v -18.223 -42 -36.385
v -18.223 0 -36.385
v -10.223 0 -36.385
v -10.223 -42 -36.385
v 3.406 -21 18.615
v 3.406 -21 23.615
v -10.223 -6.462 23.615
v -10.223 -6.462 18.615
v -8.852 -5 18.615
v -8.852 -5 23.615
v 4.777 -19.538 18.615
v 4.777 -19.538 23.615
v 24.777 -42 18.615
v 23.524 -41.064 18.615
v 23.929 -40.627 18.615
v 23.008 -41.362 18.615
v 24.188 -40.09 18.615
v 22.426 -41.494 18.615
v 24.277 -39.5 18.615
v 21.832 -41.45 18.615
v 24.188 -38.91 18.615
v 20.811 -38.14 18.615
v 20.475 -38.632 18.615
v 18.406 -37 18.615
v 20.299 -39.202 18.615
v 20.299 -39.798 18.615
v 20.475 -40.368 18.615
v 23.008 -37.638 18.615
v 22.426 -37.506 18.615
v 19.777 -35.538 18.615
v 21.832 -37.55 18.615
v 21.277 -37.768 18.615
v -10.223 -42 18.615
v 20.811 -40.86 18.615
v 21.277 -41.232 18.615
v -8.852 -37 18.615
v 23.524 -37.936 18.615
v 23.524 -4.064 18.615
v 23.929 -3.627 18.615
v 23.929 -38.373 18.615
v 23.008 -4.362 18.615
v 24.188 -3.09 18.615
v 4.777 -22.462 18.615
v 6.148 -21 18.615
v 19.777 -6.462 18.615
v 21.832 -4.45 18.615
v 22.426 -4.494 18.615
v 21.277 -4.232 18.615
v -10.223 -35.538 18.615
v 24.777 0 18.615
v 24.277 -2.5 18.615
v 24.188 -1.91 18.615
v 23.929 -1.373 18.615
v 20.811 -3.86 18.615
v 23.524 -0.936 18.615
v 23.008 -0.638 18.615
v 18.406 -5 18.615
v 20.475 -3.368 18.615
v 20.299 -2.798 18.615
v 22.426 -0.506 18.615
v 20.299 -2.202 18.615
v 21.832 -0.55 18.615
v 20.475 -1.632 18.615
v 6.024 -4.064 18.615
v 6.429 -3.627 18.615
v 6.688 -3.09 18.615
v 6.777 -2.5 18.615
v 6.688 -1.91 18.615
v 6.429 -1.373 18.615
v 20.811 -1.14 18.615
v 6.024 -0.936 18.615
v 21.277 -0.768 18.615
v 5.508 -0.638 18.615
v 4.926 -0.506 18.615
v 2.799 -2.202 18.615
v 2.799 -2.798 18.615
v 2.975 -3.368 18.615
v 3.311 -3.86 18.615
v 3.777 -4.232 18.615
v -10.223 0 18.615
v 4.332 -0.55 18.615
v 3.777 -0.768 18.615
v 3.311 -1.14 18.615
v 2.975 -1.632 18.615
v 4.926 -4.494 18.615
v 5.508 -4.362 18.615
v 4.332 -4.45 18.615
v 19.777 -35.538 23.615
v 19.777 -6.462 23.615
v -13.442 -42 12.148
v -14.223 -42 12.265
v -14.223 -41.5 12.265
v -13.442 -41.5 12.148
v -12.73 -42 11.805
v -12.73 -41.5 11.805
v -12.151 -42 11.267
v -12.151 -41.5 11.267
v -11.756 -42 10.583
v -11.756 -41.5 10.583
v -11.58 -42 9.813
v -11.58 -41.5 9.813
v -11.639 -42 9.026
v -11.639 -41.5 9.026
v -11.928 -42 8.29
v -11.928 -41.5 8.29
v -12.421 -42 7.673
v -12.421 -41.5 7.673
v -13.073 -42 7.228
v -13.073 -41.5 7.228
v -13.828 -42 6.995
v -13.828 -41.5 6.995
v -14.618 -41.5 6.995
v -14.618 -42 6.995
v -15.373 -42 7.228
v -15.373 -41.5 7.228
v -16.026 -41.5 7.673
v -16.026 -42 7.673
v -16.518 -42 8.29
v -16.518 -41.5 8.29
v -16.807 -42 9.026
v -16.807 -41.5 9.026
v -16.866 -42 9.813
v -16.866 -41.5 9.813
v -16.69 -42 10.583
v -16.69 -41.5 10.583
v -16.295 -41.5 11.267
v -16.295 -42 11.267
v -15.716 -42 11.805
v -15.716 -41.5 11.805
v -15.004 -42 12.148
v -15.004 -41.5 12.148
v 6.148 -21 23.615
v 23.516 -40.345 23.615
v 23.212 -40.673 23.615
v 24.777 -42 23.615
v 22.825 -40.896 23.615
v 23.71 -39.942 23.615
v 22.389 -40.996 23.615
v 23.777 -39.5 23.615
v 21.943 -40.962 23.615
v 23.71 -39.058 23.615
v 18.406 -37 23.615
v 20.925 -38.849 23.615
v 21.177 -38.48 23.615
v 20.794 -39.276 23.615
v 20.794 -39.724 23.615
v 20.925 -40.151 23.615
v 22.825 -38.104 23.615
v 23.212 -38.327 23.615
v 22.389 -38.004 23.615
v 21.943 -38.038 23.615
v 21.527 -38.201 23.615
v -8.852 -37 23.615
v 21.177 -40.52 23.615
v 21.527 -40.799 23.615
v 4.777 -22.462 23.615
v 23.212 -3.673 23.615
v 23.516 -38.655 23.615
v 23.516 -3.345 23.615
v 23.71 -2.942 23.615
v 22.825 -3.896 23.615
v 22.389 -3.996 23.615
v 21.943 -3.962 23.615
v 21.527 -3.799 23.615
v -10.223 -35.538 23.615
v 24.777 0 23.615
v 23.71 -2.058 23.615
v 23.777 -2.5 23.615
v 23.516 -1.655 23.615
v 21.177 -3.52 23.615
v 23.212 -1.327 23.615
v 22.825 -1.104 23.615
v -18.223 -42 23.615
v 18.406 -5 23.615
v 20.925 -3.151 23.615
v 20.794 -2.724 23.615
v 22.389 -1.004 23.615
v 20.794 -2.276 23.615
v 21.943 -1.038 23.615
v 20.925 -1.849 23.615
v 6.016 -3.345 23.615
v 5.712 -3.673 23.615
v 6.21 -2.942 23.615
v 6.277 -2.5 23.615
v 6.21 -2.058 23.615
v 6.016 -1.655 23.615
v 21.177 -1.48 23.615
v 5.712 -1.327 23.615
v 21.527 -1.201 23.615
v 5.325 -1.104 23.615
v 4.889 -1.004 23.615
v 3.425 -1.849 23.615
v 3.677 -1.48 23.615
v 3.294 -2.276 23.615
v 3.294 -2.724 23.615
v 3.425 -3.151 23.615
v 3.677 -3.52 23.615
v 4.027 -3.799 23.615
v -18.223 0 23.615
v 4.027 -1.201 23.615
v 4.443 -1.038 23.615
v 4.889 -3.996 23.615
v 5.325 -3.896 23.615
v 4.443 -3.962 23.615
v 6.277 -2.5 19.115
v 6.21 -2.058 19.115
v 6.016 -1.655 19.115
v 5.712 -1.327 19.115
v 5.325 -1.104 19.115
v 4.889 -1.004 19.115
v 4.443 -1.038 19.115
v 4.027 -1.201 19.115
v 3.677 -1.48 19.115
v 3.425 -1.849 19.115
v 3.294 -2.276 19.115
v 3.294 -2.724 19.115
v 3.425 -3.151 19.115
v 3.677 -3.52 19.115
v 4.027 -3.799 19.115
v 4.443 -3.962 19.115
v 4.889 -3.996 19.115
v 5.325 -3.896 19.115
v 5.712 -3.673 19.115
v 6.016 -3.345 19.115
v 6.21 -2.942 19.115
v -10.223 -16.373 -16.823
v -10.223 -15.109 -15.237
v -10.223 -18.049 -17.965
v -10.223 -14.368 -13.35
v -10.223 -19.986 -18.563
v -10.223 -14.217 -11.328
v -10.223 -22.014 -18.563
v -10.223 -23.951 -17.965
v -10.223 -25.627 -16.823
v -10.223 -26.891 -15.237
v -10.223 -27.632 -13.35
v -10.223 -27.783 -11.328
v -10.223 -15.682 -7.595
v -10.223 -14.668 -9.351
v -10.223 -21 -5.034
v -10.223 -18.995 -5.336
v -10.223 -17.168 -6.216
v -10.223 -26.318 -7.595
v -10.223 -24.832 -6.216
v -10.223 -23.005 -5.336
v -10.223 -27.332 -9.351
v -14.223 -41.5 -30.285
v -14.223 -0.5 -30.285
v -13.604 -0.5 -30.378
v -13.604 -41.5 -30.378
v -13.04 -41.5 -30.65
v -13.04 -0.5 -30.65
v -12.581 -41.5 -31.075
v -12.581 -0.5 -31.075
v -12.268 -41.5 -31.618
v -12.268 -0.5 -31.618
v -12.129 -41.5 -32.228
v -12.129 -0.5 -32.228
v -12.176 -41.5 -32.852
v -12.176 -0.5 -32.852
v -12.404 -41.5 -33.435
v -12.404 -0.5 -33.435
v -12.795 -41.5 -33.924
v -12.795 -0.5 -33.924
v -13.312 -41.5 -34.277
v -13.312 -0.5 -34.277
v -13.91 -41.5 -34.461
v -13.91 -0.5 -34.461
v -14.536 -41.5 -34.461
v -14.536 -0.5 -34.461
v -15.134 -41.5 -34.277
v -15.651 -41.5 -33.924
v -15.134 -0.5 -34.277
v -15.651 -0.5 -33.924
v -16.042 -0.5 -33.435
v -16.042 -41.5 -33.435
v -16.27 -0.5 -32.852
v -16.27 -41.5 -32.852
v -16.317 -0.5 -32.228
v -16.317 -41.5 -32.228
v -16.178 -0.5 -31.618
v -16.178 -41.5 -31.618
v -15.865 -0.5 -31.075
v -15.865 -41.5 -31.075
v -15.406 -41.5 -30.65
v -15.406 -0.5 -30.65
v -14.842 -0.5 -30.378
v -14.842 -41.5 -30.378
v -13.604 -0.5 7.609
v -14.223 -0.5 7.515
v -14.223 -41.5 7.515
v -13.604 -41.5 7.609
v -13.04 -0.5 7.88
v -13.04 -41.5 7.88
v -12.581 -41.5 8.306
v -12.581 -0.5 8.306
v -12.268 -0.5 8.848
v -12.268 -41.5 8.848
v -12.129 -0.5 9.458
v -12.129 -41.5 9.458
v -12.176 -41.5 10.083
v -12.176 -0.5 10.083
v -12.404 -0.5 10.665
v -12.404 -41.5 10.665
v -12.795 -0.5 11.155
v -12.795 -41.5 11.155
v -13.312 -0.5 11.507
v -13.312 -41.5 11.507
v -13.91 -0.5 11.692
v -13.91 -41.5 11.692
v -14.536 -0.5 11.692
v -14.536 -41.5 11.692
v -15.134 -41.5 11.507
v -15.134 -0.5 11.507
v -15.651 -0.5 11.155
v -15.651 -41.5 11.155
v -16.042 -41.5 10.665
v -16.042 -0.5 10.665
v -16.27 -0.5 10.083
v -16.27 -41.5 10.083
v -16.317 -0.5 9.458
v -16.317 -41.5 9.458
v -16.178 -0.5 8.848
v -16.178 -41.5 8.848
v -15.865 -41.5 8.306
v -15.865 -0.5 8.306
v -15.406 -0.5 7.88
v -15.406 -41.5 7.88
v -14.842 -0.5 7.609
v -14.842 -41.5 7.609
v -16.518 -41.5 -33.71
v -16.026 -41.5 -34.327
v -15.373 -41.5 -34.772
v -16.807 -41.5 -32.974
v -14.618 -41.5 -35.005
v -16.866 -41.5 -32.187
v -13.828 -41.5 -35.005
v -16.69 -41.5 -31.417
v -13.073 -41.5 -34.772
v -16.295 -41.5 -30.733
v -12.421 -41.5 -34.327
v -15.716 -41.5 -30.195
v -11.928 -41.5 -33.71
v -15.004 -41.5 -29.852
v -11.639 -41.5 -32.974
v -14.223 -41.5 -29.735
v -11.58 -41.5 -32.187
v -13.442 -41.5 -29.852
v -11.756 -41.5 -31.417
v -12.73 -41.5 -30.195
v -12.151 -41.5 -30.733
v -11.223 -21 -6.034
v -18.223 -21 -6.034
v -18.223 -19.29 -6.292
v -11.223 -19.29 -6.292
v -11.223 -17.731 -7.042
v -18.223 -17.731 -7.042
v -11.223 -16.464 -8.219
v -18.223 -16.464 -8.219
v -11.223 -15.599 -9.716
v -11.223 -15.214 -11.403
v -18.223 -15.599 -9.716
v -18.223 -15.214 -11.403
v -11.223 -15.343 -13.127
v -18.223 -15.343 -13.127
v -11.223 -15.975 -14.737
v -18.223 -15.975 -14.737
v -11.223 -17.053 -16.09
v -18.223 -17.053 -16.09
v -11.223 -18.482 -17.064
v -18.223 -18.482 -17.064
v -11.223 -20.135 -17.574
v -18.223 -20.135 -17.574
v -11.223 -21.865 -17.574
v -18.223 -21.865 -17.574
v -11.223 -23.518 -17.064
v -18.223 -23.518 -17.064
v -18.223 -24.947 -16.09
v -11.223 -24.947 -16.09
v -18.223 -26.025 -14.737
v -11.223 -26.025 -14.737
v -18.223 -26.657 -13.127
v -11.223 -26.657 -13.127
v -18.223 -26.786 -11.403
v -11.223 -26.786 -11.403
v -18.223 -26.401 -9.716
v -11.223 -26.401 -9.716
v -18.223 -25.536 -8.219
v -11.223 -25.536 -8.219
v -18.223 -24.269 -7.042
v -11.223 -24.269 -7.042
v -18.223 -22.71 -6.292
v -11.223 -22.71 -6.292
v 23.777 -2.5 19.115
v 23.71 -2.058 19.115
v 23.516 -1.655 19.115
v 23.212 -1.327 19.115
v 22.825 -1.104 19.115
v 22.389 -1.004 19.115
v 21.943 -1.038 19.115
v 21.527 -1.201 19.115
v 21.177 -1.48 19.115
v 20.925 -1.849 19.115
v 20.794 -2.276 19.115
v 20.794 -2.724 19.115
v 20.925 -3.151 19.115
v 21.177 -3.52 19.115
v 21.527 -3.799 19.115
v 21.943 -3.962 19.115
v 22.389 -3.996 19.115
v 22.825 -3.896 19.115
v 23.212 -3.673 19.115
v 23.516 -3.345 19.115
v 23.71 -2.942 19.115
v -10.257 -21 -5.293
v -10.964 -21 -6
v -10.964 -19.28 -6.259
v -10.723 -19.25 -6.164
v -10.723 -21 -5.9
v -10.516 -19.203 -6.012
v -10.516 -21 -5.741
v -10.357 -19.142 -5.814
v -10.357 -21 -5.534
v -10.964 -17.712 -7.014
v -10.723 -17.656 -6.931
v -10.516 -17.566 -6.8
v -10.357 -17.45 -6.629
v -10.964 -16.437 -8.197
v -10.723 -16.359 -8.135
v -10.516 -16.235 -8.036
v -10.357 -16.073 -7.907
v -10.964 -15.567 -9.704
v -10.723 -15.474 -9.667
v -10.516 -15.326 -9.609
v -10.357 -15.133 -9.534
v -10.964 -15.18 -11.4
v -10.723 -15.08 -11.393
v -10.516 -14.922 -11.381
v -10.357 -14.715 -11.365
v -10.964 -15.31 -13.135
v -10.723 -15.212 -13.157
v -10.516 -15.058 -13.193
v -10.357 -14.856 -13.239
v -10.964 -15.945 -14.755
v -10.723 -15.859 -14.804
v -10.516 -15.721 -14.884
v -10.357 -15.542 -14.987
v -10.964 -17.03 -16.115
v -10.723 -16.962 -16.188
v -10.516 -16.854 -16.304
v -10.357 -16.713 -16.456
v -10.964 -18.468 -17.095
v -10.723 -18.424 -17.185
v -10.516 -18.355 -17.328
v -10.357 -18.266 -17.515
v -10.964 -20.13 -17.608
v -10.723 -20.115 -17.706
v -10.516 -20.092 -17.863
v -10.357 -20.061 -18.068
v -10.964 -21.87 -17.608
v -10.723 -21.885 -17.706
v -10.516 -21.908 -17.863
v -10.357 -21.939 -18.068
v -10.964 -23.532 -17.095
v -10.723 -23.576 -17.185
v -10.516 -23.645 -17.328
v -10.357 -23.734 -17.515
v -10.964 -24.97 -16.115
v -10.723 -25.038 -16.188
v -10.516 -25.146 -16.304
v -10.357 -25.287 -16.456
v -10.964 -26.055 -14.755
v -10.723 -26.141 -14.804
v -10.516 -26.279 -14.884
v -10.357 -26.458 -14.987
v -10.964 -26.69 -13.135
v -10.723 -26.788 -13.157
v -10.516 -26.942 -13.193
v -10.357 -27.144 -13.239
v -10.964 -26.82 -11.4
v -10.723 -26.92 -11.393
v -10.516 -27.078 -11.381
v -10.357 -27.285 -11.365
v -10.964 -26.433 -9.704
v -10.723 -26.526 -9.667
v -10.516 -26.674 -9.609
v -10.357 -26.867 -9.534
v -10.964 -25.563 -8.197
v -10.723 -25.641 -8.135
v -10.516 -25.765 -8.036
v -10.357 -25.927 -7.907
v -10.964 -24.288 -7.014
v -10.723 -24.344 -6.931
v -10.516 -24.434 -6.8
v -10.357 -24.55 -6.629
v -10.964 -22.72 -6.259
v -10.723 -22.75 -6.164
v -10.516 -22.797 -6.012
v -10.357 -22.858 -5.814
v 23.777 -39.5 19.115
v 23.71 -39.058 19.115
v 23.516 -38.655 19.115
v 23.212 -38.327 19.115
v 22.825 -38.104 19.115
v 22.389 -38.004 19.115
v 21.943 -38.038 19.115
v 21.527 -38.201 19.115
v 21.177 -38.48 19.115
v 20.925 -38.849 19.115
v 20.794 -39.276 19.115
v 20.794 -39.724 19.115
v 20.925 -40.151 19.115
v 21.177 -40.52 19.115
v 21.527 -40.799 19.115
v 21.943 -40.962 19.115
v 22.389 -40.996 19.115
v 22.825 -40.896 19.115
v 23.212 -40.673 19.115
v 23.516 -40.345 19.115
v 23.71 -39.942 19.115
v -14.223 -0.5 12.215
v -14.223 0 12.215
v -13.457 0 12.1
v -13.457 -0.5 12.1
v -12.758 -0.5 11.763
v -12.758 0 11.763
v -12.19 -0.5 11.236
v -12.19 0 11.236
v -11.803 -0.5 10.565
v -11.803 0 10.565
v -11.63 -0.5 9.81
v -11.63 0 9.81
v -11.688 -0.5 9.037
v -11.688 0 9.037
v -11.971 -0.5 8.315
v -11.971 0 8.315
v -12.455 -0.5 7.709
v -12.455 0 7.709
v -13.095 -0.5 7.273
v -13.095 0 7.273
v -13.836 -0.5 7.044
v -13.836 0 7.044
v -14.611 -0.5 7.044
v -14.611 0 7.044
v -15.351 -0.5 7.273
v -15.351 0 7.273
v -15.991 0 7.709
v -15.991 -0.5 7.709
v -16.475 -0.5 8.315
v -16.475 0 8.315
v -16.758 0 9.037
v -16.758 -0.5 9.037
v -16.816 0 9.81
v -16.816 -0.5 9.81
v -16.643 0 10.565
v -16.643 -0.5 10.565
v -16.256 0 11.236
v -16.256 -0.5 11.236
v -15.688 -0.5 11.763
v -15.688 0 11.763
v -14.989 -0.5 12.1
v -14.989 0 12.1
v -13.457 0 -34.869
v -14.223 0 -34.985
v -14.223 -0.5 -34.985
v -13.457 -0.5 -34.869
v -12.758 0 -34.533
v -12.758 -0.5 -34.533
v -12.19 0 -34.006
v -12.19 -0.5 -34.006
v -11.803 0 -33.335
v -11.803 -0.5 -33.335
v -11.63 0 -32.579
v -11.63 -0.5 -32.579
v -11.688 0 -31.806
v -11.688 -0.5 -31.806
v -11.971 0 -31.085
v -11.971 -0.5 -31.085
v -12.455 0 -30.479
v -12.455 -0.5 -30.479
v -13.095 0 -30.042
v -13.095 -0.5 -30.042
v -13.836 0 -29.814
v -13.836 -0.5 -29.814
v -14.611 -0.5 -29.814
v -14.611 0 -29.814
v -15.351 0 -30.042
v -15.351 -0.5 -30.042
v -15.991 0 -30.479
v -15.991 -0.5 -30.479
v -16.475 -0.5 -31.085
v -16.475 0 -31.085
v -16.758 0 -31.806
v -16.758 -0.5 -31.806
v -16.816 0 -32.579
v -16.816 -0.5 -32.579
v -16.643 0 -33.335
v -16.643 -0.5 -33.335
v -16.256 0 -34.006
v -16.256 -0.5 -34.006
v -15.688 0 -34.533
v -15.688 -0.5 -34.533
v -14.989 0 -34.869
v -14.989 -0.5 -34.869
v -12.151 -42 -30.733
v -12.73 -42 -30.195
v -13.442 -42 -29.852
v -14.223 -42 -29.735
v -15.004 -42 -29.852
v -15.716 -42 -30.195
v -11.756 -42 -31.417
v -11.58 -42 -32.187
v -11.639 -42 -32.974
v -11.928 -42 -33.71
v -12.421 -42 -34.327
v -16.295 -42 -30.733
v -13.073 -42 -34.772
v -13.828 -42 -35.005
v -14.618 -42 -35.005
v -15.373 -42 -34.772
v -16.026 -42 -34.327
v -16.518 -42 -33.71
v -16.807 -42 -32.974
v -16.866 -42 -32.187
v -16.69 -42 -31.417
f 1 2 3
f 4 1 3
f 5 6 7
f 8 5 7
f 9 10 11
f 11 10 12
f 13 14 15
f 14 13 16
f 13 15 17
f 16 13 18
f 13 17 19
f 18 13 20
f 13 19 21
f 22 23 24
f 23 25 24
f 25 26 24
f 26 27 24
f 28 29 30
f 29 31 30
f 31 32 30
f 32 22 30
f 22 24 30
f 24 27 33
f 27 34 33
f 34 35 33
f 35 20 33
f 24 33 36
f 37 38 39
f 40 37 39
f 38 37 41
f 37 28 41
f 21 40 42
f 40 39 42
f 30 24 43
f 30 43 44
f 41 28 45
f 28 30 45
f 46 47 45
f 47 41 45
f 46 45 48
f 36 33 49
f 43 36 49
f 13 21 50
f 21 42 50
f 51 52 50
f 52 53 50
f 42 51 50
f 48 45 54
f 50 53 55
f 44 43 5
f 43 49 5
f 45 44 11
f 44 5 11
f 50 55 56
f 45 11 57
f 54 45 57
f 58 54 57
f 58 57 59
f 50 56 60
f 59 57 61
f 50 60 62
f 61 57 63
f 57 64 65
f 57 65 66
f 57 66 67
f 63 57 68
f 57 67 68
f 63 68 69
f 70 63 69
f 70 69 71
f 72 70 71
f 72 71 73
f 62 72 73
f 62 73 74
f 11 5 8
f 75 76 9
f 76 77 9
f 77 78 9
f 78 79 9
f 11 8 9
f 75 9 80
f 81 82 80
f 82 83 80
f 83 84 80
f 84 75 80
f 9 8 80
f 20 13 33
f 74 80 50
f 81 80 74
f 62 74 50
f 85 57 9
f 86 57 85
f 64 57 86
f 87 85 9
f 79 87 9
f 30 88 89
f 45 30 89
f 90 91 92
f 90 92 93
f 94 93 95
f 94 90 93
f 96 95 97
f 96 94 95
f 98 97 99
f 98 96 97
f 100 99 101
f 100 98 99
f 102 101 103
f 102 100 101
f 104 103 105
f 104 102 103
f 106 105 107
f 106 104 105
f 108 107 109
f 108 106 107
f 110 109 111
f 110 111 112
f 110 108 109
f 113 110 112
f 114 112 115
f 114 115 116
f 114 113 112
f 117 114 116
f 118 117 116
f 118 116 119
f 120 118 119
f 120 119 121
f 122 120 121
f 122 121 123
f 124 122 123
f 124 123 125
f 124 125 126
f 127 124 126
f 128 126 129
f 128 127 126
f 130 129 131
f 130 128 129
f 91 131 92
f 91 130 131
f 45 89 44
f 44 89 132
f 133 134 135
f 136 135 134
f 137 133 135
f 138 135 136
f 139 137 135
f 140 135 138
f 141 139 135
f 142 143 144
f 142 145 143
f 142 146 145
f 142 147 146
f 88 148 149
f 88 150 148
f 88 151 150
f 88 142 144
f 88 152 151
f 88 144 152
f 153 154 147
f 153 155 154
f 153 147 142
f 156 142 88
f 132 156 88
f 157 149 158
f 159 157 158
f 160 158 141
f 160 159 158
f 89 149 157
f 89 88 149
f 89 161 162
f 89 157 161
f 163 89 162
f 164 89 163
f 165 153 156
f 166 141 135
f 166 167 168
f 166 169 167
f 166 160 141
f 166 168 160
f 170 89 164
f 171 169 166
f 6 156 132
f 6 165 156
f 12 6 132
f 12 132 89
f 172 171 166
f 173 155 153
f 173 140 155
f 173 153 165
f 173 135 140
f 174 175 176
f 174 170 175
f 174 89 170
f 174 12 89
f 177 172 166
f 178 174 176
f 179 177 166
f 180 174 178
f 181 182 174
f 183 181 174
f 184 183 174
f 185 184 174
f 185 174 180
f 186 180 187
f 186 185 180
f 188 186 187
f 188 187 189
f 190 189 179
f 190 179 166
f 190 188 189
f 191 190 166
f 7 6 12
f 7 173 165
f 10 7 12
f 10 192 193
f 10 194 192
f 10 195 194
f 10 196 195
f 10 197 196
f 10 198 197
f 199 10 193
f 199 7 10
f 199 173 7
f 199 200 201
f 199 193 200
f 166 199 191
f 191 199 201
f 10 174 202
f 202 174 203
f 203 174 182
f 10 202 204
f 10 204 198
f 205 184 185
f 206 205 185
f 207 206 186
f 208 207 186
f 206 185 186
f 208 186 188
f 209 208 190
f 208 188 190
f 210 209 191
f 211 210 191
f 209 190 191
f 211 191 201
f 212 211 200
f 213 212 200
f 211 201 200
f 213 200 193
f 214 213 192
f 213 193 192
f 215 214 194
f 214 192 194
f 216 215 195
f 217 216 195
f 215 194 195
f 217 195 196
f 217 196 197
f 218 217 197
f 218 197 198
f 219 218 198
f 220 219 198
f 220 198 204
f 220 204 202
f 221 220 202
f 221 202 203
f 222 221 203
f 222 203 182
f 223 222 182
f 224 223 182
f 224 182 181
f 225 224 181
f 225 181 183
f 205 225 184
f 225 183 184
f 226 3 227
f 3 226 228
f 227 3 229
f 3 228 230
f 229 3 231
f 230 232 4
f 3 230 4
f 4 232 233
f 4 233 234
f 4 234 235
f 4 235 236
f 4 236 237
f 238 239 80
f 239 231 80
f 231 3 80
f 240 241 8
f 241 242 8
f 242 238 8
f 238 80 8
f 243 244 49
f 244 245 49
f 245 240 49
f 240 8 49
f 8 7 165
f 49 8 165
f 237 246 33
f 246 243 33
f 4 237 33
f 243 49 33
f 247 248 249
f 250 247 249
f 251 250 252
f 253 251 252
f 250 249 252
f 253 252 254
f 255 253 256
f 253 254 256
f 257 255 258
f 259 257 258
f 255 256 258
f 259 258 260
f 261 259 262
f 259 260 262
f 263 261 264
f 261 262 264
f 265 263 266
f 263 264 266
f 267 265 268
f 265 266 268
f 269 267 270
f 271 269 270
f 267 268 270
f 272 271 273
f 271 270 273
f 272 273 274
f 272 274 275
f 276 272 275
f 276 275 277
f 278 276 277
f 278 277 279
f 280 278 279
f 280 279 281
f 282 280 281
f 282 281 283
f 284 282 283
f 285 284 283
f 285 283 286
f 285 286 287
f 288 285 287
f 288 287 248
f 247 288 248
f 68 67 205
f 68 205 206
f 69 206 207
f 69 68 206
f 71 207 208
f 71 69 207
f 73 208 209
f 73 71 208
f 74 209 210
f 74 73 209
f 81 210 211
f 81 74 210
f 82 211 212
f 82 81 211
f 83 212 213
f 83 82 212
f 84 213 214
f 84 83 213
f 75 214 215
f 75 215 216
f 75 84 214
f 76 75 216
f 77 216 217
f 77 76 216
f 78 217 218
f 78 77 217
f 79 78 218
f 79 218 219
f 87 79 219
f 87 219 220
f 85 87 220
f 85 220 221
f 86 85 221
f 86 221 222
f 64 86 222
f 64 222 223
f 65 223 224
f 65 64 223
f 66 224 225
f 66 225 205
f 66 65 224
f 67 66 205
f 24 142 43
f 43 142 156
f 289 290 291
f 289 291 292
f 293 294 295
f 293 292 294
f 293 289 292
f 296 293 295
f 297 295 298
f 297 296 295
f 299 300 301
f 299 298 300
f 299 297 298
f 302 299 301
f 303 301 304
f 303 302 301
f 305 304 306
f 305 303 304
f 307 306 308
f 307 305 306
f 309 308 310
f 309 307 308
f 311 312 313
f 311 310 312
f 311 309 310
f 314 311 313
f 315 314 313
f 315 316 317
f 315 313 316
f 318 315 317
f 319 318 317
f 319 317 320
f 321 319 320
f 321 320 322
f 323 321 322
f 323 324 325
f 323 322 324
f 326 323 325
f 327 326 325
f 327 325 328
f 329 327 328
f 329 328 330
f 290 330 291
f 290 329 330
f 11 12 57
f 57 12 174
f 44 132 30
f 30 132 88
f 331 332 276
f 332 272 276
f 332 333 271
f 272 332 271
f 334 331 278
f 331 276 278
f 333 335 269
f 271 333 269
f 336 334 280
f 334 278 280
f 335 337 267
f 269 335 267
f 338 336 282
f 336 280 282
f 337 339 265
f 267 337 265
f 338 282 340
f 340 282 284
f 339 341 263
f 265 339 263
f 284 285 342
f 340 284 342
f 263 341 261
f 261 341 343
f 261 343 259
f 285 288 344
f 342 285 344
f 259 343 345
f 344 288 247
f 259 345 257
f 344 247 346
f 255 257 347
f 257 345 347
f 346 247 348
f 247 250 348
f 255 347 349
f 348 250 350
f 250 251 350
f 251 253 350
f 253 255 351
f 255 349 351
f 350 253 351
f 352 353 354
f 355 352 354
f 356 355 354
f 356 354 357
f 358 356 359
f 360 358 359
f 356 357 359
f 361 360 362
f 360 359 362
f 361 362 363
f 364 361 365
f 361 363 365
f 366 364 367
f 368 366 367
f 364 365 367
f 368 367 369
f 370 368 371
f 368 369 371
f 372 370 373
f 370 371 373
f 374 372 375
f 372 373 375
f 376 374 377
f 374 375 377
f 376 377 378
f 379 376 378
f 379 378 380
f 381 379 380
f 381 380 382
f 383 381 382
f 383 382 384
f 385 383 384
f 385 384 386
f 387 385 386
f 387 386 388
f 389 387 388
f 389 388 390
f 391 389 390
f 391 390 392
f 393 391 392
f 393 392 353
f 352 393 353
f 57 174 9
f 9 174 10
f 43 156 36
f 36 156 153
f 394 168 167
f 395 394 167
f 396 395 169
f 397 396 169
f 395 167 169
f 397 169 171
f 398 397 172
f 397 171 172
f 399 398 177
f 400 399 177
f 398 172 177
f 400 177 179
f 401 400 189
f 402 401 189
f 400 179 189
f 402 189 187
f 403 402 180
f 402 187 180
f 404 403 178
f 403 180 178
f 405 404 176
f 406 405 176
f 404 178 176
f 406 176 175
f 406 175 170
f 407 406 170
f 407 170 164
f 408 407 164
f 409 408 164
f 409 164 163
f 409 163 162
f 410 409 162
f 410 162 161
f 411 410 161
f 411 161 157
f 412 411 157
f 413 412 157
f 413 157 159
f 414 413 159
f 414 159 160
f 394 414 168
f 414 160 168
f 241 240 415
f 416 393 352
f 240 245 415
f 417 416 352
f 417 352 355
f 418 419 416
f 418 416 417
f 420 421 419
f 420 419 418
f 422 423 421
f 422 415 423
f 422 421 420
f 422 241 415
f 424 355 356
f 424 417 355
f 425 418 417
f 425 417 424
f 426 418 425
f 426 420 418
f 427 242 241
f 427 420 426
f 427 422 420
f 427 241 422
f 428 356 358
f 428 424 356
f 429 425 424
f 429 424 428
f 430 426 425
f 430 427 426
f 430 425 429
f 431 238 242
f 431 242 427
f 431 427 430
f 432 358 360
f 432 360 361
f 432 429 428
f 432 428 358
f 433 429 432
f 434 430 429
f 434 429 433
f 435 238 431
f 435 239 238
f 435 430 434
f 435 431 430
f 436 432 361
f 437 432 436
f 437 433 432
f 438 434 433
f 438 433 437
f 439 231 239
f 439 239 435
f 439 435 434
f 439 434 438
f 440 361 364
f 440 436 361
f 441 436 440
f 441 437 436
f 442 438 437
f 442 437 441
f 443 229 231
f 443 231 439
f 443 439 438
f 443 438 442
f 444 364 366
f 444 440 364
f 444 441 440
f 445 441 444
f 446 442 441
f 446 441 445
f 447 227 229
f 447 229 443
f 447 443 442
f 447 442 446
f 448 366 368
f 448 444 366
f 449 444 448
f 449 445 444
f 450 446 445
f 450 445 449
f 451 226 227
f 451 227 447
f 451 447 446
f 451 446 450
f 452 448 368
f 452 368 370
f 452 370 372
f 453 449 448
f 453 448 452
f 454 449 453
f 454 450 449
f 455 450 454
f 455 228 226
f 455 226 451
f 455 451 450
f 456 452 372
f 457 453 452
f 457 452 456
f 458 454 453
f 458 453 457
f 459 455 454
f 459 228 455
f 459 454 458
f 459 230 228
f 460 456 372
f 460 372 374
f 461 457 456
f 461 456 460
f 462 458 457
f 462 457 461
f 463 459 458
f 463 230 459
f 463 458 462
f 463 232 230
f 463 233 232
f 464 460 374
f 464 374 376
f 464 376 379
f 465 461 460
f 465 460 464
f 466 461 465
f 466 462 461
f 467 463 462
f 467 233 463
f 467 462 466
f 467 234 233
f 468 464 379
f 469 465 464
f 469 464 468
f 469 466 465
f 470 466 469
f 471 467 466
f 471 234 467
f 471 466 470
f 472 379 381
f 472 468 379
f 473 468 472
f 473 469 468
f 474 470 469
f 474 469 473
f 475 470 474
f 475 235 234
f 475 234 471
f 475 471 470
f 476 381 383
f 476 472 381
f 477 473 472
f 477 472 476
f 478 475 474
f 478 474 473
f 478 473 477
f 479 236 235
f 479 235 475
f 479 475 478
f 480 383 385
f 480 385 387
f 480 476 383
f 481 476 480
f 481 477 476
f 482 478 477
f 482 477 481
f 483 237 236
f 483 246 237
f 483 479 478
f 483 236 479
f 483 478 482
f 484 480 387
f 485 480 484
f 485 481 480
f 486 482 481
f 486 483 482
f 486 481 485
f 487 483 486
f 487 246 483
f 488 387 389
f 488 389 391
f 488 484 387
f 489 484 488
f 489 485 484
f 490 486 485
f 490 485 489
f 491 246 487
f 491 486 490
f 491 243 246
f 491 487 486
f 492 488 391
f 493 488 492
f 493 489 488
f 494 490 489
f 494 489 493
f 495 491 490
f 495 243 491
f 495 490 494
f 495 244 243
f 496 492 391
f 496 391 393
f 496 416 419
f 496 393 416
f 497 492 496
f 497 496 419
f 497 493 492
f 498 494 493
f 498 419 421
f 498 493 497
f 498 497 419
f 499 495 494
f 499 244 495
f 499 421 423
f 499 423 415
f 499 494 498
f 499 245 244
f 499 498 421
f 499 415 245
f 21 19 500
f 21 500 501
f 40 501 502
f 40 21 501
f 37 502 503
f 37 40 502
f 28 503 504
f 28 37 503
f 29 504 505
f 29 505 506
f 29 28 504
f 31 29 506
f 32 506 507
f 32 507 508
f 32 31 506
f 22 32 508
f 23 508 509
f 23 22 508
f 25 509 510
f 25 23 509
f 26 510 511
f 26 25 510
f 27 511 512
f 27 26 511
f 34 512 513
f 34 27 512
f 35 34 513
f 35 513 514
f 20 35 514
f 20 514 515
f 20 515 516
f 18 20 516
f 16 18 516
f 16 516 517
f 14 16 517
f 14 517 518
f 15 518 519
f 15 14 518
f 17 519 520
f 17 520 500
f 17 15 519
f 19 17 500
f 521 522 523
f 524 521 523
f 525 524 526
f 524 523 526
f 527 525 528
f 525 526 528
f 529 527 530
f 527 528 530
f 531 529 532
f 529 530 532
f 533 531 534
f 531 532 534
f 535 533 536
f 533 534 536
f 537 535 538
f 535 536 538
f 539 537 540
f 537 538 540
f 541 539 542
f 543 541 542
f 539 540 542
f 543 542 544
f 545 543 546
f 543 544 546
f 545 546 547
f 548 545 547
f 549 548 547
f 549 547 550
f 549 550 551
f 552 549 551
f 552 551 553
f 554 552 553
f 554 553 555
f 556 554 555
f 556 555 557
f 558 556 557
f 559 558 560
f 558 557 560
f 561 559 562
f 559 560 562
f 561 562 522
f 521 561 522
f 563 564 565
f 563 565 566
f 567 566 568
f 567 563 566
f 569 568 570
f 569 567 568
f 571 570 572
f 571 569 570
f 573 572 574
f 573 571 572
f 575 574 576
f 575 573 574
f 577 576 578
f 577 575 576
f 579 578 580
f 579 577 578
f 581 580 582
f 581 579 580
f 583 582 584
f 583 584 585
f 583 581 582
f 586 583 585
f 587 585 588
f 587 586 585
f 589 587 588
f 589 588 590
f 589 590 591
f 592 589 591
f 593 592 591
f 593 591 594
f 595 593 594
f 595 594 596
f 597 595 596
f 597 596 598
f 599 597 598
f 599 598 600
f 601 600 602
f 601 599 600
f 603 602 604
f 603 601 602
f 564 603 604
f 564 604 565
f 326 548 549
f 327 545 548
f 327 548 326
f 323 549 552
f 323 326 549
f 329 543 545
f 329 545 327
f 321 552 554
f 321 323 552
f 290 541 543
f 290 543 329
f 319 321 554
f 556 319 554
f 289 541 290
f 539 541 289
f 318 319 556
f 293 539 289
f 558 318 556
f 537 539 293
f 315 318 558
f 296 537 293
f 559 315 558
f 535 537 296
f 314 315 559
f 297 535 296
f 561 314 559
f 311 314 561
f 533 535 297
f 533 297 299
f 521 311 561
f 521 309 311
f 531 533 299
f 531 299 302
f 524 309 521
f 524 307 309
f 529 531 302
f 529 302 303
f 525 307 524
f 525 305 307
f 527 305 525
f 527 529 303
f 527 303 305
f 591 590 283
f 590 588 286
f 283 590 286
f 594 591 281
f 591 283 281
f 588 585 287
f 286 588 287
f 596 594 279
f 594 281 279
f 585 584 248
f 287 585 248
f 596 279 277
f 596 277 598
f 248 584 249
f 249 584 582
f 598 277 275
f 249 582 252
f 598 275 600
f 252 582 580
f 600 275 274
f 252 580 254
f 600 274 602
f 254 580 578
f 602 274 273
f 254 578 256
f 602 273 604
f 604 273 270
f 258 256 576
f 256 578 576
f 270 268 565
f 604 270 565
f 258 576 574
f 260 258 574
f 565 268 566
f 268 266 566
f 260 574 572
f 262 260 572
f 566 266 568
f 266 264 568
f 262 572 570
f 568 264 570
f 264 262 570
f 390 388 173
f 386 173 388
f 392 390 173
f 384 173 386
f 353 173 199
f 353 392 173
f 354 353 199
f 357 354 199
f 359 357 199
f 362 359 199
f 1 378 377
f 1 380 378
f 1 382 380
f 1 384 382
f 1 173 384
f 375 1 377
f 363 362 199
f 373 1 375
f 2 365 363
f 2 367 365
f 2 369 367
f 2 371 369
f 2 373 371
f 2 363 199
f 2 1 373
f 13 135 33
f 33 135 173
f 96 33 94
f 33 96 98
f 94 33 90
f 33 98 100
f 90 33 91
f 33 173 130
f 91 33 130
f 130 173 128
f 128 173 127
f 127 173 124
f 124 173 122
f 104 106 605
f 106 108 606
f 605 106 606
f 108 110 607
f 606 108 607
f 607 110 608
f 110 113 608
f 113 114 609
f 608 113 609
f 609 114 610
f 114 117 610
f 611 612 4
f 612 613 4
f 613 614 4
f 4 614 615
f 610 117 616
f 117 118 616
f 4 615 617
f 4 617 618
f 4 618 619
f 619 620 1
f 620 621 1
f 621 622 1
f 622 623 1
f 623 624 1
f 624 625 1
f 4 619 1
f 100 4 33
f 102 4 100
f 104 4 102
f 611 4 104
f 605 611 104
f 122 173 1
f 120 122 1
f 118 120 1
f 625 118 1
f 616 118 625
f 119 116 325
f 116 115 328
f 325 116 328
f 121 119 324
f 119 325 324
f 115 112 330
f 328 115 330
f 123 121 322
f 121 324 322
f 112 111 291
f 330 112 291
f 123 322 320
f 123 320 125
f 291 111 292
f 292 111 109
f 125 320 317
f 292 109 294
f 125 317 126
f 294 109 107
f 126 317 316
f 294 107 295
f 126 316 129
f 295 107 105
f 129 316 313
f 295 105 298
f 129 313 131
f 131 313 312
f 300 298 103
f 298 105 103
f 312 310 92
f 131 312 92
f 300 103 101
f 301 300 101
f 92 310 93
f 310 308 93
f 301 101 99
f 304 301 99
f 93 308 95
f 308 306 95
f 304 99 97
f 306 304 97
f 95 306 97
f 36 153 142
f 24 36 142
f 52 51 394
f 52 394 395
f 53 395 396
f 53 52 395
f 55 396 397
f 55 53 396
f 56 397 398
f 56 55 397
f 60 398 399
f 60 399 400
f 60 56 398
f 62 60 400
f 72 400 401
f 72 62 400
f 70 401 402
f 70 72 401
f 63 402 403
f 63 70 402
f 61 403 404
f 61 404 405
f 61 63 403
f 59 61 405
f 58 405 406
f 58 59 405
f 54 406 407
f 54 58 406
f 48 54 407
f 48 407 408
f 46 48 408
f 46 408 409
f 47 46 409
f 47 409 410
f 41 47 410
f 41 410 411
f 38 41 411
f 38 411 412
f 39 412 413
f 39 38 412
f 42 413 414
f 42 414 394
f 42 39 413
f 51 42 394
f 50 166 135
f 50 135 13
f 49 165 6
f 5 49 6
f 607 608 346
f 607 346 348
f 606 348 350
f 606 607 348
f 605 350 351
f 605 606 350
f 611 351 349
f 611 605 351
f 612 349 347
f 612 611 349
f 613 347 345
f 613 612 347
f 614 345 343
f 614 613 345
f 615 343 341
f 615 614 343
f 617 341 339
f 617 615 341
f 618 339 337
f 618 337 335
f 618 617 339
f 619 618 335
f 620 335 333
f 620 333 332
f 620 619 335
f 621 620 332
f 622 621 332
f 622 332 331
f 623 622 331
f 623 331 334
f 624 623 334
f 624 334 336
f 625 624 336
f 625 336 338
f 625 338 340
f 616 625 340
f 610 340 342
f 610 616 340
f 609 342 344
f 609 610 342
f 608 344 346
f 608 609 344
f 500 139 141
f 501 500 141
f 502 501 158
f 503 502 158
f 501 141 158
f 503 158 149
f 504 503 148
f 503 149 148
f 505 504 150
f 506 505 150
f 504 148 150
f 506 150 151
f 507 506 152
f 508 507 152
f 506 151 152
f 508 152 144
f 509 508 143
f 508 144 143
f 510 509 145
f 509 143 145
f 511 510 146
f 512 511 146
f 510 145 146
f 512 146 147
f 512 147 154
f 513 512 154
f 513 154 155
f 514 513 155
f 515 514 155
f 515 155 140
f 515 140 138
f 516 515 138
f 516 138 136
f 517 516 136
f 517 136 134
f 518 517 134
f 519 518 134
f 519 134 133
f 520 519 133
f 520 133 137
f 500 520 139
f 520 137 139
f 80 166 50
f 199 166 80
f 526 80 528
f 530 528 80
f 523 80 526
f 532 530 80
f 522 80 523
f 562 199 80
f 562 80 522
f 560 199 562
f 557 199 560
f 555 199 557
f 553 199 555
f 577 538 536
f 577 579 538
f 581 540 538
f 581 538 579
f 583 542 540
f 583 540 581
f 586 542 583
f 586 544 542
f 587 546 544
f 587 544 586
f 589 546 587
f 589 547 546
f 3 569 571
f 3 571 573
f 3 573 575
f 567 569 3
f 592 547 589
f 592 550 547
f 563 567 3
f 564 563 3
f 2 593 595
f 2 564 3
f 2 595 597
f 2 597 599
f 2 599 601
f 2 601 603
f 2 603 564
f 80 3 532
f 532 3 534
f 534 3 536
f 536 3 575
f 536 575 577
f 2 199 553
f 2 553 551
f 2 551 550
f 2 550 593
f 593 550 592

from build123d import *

# Parameters (mm, degrees)
SKETCH1_W           = 25
SKETCH1_H           = 50
SKETCH1_R           = 3.4
BOSS_EXTRUDE1_DEPTH = 3
SKETCH2_W           = 50
SKETCH2_H           = 3
BOSS_EXTRUDE2_DEPTH = 8
SKETCH3_W           = 8
SKETCH3_H           = 50
BOSS_EXTRUDE3_DEPTH = 42
SKETCH4_R           = 2.65
CUT_EXTRUDE1_DEPTH  = 0.5
SKETCH5_R           = 5.802370205
CUT_EXTRUDE2_DEPTH  = 9
FILLET2_R           = 1
SKETCH6_R           = 12.6
BOSS_EXTRUDE4_DEPTH = 2
FILLET4_R           = 1
SKETCH8_R           = 1.589780168
SKETCH8_R_2         = 1.777428262
CUT_EXTRUDE3_DEPTH  = 10
SKETCH9_W           = 49.021678163
SKETCH9_H           = 20.976854622
CUT_EXTRUDE4_DEPTH  = 68.79439129
SKETCH11_R          = 2.1
CUT_EXTRUDE5_DEPTH  = 59.480168703
SKETCH14_R          = 2.6
CUT_EXTRUDE6_DEPTH  = 0.5
SKETCH15_W          = 8
SKETCH15_H          = 42
BOSS_EXTRUDE5_DEPTH = 10
SKETCH17_W          = 5
SKETCH17_H          = 42
BOSS_EXTRUDE6_DEPTH = 35
CUT_EXTRUDE7_DEPTH  = 5
SKETCH22_R          = 1.5
CUT_EXTRUDE8_DEPTH  = 5
CHAMFER1_SIZE       = 0.5


with BuildPart() as part:
    # Sketch1 → Boss-Extrude1 (new body)
    with BuildSketch(Plane(origin=(0, 0, 0), x_dir=(1, 0, 0), z_dir=(0, 1, 0))):
        with Locations((2.276951673, 11.384758364)):
            Rectangle(SKETCH1_W, SKETCH1_H)
        with Locations(Location((1.276951673, 11.384758364, 0), (0, 0, 270))):
            Circle(SKETCH1_R, mode=Mode.SUBTRACT)
    extrude(amount=BOSS_EXTRUDE1_DEPTH)

    # Sketch2 → Boss-Extrude2 (add)
    with BuildSketch(Plane.ZY.offset(10.223048327)):
        with Locations((-11.384758364, 1.5)):
            Rectangle(SKETCH2_W, SKETCH2_H)
    extrude(amount=BOSS_EXTRUDE2_DEPTH)

    # Sketch3 → Boss-Extrude3 (add)
    with BuildSketch(Plane.XZ):
        with Locations((-14.223048327, -11.384758364)):
            Rectangle(SKETCH3_W, SKETCH3_H)
    extrude(amount=BOSS_EXTRUDE3_DEPTH)

    # Sketch4 → Cut-Extrude1 (cut)
    with BuildSketch(Plane(origin=(0, 3, 0), x_dir=(1, 0, 0), z_dir=(0, 1, 0))):
        with Locations(Location((-14.223048327, 32.384758364, 0), (0, 0, 270))):
            Circle(SKETCH4_R)
        with Locations(Location((-14.223048327, -9.615241636, 0), (0, 0, 270))):
            Circle(SKETCH4_R)
    cut_extrude1 = extrude(amount=-CUT_EXTRUDE1_DEPTH, mode=Mode.SUBTRACT)

    # Mirror1: Cut-Extrude1 across plane
    add(cut_extrude1.mirror(Plane.ZX.offset(-19.5)), mode=Mode.SUBTRACT)

    # Sketch5 → Cut-Extrude2 (cut)
    with BuildSketch(Plane.ZY.offset(18.223048327)):
        with Locations((-11.836279124, -21)):
            Circle(SKETCH5_R)
    extrude(amount=-CUT_EXTRUDE2_DEPTH, mode=Mode.SUBTRACT)

    # Fillet2
    fillet2_edges = [part.edges().sort_by_distance(p)[0] for p in [
        (-10.223048327, -21, -17.638649329),
    ]]
    fillet(fillet2_edges, radius=FILLET2_R)

    # Mirror2: Cut-Extrude1 across plane
    add(cut_extrude1.mirror(Plane.ZY.offset(1.723048327)), mode=Mode.SUBTRACT)

    # Sketch6 → Boss-Extrude4 (add)
    with BuildSketch(Plane(origin=(0, 3, 0), x_dir=(1, 0, 0), z_dir=(0, 1, 0))):
        with BuildLine():
            Line((14.776951673, 5.825082115), (14.776951673, 16.944434614))
            ThreePointArc((14.776951673, 16.944434614), (-13.323048327, 11.384758364), (14.776951673, 5.825082115))
        make_face()
        with Locations(Location((1.276951673, 11.384758364, 0), (0, 0, 270))):
            Circle(SKETCH6_R, mode=Mode.SUBTRACT)
    extrude(amount=BOSS_EXTRUDE4_DEPTH)

    # Fillet4
    # the kernel refuses this fillet: 1 mm, written as the material it takes off along each edge
    with BuildSketch(Plane(origin=(14.776951673, 5, -3.325082115), x_dir=(0, -1, 0), z_dir=(0, 0, -1))) as fillet4_piece_1:
        with BuildLine():
            CenterArc((FILLET4_R, FILLET4_R), FILLET4_R, 180, 90)
            Line((0, FILLET4_R), (0, 0))
            Line((0, 0), (FILLET4_R, 0))
        make_face()
    extrude(amount=16.119352499, mode=Mode.SUBTRACT)

    # Sketch8 → Cut-Extrude3 (cut)
    with BuildSketch(Plane(origin=(0, 3, 0), x_dir=(1, 0, 0), z_dir=(0, 1, 0))):
        with Locations(Location((1.276951673, 19.884758364, 0), (0, 0, 270))):
            Circle(SKETCH8_R)
        with Locations(Location((1.276951673, 2.884758364, 0), (0, 0, 270))):
            Circle(SKETCH8_R_2)
    extrude(amount=-CUT_EXTRUDE3_DEPTH, mode=Mode.SUBTRACT)

    # Sketch9 → Cut-Extrude4 (cut, through all)
    with BuildSketch(Plane.XY.offset(13.615241636)):
        with Locations((-9.733887409, 10.488427311)):
            Rectangle(SKETCH9_W, SKETCH9_H)
    extrude(amount=-CUT_EXTRUDE4_DEPTH, mode=Mode.SUBTRACT)

    # Sketch11 → Cut-Extrude5 (cut, through all)
    with BuildSketch(Plane(origin=(0, 0, 0), x_dir=(1, 0, 0), z_dir=(0, 1, 0))):
        with Locations(Location((-14.223048327, 32.384758364, 0), (0, 0, 270))):
            Circle(SKETCH11_R)
    cut_extrude5 = extrude(amount=-CUT_EXTRUDE5_DEPTH, mode=Mode.SUBTRACT)

    # Mirror3: Cut-Extrude5 across plane
    add(cut_extrude5.mirror(Plane.XY.offset(-11.384758364)), mode=Mode.SUBTRACT)

    # Sketch14 → Cut-Extrude6 (cut)
    with BuildSketch(Plane(origin=(0, 0, 0), x_dir=(1, 0, 0), z_dir=(0, 1, 0))):
        with Locations(Location((-14.223048327, -9.615241636, 0), (0, 0, 270))):
            Circle(SKETCH14_R)
    cut_extrude6 = extrude(amount=-CUT_EXTRUDE6_DEPTH, mode=Mode.SUBTRACT)

    # Mirror4: Cut-Extrude6 across plane
    add(cut_extrude6.mirror(Plane.XY.offset(-11.384758364)), mode=Mode.SUBTRACT)

    # Sketch15 → Boss-Extrude5 (add)
    with BuildSketch(Plane.XY.offset(13.615241636)):
        with Locations((-14.223048327, -21)):
            Rectangle(SKETCH15_W, SKETCH15_H)
    extrude(amount=BOSS_EXTRUDE5_DEPTH)

    # Sketch17 → Boss-Extrude6 (add)
    with BuildSketch(Plane(origin=(-10.223048327, 0, 0), x_dir=(0, 0, -1), z_dir=(1, 0, 0))):
        with Locations((-21.115241636, -21)):
            Rectangle(SKETCH17_W, SKETCH17_H)
    extrude(amount=BOSS_EXTRUDE6_DEPTH)

    # Sketch21 → Cut-Extrude7 (cut)
    with BuildSketch(Plane.XY.offset(23.615241636)):
        Polygon((3.40621966, -21), (-10.223048327, -6.462114147), (-10.223048327, -35.537885853), align=None)
        Polygon((18.40621966, -5), (-8.852316315, -5), (4.776951673, -19.537885853), align=None)
        Polygon((19.776951673, -35.537885853), (19.776951673, -6.462114147), (6.147683685, -21), align=None)
        Polygon((4.776951673, -22.462114147), (-8.852316315, -37), (18.40621966, -37), align=None)
    extrude(amount=-CUT_EXTRUDE7_DEPTH, mode=Mode.SUBTRACT)

    # Sketch22 → Cut-Extrude8 (cut)
    with BuildSketch(Plane.XY.offset(23.615241636)):
        with Locations((22.276951673, -2.5)):
            Circle(SKETCH22_R)
        with Locations((22.276951673, -39.5)):
            Circle(SKETCH22_R)
        with Locations((4.776951673, -2.5)):
            Circle(SKETCH22_R)
    extrude(amount=-CUT_EXTRUDE8_DEPTH, mode=Mode.SUBTRACT)

    # Chamfer1
    chamfer1_edges = [part.edges().sort_by_distance(p)[0] for p in [
        (3.276951673, -2.5, 18.615241636),
        (20.776951673, -39.5, 18.615241636),
        (20.776951673, -2.5, 18.615241636),
    ]]
    chamfer(chamfer1_edges, length=CHAMFER1_SIZE)


solid = part.part
